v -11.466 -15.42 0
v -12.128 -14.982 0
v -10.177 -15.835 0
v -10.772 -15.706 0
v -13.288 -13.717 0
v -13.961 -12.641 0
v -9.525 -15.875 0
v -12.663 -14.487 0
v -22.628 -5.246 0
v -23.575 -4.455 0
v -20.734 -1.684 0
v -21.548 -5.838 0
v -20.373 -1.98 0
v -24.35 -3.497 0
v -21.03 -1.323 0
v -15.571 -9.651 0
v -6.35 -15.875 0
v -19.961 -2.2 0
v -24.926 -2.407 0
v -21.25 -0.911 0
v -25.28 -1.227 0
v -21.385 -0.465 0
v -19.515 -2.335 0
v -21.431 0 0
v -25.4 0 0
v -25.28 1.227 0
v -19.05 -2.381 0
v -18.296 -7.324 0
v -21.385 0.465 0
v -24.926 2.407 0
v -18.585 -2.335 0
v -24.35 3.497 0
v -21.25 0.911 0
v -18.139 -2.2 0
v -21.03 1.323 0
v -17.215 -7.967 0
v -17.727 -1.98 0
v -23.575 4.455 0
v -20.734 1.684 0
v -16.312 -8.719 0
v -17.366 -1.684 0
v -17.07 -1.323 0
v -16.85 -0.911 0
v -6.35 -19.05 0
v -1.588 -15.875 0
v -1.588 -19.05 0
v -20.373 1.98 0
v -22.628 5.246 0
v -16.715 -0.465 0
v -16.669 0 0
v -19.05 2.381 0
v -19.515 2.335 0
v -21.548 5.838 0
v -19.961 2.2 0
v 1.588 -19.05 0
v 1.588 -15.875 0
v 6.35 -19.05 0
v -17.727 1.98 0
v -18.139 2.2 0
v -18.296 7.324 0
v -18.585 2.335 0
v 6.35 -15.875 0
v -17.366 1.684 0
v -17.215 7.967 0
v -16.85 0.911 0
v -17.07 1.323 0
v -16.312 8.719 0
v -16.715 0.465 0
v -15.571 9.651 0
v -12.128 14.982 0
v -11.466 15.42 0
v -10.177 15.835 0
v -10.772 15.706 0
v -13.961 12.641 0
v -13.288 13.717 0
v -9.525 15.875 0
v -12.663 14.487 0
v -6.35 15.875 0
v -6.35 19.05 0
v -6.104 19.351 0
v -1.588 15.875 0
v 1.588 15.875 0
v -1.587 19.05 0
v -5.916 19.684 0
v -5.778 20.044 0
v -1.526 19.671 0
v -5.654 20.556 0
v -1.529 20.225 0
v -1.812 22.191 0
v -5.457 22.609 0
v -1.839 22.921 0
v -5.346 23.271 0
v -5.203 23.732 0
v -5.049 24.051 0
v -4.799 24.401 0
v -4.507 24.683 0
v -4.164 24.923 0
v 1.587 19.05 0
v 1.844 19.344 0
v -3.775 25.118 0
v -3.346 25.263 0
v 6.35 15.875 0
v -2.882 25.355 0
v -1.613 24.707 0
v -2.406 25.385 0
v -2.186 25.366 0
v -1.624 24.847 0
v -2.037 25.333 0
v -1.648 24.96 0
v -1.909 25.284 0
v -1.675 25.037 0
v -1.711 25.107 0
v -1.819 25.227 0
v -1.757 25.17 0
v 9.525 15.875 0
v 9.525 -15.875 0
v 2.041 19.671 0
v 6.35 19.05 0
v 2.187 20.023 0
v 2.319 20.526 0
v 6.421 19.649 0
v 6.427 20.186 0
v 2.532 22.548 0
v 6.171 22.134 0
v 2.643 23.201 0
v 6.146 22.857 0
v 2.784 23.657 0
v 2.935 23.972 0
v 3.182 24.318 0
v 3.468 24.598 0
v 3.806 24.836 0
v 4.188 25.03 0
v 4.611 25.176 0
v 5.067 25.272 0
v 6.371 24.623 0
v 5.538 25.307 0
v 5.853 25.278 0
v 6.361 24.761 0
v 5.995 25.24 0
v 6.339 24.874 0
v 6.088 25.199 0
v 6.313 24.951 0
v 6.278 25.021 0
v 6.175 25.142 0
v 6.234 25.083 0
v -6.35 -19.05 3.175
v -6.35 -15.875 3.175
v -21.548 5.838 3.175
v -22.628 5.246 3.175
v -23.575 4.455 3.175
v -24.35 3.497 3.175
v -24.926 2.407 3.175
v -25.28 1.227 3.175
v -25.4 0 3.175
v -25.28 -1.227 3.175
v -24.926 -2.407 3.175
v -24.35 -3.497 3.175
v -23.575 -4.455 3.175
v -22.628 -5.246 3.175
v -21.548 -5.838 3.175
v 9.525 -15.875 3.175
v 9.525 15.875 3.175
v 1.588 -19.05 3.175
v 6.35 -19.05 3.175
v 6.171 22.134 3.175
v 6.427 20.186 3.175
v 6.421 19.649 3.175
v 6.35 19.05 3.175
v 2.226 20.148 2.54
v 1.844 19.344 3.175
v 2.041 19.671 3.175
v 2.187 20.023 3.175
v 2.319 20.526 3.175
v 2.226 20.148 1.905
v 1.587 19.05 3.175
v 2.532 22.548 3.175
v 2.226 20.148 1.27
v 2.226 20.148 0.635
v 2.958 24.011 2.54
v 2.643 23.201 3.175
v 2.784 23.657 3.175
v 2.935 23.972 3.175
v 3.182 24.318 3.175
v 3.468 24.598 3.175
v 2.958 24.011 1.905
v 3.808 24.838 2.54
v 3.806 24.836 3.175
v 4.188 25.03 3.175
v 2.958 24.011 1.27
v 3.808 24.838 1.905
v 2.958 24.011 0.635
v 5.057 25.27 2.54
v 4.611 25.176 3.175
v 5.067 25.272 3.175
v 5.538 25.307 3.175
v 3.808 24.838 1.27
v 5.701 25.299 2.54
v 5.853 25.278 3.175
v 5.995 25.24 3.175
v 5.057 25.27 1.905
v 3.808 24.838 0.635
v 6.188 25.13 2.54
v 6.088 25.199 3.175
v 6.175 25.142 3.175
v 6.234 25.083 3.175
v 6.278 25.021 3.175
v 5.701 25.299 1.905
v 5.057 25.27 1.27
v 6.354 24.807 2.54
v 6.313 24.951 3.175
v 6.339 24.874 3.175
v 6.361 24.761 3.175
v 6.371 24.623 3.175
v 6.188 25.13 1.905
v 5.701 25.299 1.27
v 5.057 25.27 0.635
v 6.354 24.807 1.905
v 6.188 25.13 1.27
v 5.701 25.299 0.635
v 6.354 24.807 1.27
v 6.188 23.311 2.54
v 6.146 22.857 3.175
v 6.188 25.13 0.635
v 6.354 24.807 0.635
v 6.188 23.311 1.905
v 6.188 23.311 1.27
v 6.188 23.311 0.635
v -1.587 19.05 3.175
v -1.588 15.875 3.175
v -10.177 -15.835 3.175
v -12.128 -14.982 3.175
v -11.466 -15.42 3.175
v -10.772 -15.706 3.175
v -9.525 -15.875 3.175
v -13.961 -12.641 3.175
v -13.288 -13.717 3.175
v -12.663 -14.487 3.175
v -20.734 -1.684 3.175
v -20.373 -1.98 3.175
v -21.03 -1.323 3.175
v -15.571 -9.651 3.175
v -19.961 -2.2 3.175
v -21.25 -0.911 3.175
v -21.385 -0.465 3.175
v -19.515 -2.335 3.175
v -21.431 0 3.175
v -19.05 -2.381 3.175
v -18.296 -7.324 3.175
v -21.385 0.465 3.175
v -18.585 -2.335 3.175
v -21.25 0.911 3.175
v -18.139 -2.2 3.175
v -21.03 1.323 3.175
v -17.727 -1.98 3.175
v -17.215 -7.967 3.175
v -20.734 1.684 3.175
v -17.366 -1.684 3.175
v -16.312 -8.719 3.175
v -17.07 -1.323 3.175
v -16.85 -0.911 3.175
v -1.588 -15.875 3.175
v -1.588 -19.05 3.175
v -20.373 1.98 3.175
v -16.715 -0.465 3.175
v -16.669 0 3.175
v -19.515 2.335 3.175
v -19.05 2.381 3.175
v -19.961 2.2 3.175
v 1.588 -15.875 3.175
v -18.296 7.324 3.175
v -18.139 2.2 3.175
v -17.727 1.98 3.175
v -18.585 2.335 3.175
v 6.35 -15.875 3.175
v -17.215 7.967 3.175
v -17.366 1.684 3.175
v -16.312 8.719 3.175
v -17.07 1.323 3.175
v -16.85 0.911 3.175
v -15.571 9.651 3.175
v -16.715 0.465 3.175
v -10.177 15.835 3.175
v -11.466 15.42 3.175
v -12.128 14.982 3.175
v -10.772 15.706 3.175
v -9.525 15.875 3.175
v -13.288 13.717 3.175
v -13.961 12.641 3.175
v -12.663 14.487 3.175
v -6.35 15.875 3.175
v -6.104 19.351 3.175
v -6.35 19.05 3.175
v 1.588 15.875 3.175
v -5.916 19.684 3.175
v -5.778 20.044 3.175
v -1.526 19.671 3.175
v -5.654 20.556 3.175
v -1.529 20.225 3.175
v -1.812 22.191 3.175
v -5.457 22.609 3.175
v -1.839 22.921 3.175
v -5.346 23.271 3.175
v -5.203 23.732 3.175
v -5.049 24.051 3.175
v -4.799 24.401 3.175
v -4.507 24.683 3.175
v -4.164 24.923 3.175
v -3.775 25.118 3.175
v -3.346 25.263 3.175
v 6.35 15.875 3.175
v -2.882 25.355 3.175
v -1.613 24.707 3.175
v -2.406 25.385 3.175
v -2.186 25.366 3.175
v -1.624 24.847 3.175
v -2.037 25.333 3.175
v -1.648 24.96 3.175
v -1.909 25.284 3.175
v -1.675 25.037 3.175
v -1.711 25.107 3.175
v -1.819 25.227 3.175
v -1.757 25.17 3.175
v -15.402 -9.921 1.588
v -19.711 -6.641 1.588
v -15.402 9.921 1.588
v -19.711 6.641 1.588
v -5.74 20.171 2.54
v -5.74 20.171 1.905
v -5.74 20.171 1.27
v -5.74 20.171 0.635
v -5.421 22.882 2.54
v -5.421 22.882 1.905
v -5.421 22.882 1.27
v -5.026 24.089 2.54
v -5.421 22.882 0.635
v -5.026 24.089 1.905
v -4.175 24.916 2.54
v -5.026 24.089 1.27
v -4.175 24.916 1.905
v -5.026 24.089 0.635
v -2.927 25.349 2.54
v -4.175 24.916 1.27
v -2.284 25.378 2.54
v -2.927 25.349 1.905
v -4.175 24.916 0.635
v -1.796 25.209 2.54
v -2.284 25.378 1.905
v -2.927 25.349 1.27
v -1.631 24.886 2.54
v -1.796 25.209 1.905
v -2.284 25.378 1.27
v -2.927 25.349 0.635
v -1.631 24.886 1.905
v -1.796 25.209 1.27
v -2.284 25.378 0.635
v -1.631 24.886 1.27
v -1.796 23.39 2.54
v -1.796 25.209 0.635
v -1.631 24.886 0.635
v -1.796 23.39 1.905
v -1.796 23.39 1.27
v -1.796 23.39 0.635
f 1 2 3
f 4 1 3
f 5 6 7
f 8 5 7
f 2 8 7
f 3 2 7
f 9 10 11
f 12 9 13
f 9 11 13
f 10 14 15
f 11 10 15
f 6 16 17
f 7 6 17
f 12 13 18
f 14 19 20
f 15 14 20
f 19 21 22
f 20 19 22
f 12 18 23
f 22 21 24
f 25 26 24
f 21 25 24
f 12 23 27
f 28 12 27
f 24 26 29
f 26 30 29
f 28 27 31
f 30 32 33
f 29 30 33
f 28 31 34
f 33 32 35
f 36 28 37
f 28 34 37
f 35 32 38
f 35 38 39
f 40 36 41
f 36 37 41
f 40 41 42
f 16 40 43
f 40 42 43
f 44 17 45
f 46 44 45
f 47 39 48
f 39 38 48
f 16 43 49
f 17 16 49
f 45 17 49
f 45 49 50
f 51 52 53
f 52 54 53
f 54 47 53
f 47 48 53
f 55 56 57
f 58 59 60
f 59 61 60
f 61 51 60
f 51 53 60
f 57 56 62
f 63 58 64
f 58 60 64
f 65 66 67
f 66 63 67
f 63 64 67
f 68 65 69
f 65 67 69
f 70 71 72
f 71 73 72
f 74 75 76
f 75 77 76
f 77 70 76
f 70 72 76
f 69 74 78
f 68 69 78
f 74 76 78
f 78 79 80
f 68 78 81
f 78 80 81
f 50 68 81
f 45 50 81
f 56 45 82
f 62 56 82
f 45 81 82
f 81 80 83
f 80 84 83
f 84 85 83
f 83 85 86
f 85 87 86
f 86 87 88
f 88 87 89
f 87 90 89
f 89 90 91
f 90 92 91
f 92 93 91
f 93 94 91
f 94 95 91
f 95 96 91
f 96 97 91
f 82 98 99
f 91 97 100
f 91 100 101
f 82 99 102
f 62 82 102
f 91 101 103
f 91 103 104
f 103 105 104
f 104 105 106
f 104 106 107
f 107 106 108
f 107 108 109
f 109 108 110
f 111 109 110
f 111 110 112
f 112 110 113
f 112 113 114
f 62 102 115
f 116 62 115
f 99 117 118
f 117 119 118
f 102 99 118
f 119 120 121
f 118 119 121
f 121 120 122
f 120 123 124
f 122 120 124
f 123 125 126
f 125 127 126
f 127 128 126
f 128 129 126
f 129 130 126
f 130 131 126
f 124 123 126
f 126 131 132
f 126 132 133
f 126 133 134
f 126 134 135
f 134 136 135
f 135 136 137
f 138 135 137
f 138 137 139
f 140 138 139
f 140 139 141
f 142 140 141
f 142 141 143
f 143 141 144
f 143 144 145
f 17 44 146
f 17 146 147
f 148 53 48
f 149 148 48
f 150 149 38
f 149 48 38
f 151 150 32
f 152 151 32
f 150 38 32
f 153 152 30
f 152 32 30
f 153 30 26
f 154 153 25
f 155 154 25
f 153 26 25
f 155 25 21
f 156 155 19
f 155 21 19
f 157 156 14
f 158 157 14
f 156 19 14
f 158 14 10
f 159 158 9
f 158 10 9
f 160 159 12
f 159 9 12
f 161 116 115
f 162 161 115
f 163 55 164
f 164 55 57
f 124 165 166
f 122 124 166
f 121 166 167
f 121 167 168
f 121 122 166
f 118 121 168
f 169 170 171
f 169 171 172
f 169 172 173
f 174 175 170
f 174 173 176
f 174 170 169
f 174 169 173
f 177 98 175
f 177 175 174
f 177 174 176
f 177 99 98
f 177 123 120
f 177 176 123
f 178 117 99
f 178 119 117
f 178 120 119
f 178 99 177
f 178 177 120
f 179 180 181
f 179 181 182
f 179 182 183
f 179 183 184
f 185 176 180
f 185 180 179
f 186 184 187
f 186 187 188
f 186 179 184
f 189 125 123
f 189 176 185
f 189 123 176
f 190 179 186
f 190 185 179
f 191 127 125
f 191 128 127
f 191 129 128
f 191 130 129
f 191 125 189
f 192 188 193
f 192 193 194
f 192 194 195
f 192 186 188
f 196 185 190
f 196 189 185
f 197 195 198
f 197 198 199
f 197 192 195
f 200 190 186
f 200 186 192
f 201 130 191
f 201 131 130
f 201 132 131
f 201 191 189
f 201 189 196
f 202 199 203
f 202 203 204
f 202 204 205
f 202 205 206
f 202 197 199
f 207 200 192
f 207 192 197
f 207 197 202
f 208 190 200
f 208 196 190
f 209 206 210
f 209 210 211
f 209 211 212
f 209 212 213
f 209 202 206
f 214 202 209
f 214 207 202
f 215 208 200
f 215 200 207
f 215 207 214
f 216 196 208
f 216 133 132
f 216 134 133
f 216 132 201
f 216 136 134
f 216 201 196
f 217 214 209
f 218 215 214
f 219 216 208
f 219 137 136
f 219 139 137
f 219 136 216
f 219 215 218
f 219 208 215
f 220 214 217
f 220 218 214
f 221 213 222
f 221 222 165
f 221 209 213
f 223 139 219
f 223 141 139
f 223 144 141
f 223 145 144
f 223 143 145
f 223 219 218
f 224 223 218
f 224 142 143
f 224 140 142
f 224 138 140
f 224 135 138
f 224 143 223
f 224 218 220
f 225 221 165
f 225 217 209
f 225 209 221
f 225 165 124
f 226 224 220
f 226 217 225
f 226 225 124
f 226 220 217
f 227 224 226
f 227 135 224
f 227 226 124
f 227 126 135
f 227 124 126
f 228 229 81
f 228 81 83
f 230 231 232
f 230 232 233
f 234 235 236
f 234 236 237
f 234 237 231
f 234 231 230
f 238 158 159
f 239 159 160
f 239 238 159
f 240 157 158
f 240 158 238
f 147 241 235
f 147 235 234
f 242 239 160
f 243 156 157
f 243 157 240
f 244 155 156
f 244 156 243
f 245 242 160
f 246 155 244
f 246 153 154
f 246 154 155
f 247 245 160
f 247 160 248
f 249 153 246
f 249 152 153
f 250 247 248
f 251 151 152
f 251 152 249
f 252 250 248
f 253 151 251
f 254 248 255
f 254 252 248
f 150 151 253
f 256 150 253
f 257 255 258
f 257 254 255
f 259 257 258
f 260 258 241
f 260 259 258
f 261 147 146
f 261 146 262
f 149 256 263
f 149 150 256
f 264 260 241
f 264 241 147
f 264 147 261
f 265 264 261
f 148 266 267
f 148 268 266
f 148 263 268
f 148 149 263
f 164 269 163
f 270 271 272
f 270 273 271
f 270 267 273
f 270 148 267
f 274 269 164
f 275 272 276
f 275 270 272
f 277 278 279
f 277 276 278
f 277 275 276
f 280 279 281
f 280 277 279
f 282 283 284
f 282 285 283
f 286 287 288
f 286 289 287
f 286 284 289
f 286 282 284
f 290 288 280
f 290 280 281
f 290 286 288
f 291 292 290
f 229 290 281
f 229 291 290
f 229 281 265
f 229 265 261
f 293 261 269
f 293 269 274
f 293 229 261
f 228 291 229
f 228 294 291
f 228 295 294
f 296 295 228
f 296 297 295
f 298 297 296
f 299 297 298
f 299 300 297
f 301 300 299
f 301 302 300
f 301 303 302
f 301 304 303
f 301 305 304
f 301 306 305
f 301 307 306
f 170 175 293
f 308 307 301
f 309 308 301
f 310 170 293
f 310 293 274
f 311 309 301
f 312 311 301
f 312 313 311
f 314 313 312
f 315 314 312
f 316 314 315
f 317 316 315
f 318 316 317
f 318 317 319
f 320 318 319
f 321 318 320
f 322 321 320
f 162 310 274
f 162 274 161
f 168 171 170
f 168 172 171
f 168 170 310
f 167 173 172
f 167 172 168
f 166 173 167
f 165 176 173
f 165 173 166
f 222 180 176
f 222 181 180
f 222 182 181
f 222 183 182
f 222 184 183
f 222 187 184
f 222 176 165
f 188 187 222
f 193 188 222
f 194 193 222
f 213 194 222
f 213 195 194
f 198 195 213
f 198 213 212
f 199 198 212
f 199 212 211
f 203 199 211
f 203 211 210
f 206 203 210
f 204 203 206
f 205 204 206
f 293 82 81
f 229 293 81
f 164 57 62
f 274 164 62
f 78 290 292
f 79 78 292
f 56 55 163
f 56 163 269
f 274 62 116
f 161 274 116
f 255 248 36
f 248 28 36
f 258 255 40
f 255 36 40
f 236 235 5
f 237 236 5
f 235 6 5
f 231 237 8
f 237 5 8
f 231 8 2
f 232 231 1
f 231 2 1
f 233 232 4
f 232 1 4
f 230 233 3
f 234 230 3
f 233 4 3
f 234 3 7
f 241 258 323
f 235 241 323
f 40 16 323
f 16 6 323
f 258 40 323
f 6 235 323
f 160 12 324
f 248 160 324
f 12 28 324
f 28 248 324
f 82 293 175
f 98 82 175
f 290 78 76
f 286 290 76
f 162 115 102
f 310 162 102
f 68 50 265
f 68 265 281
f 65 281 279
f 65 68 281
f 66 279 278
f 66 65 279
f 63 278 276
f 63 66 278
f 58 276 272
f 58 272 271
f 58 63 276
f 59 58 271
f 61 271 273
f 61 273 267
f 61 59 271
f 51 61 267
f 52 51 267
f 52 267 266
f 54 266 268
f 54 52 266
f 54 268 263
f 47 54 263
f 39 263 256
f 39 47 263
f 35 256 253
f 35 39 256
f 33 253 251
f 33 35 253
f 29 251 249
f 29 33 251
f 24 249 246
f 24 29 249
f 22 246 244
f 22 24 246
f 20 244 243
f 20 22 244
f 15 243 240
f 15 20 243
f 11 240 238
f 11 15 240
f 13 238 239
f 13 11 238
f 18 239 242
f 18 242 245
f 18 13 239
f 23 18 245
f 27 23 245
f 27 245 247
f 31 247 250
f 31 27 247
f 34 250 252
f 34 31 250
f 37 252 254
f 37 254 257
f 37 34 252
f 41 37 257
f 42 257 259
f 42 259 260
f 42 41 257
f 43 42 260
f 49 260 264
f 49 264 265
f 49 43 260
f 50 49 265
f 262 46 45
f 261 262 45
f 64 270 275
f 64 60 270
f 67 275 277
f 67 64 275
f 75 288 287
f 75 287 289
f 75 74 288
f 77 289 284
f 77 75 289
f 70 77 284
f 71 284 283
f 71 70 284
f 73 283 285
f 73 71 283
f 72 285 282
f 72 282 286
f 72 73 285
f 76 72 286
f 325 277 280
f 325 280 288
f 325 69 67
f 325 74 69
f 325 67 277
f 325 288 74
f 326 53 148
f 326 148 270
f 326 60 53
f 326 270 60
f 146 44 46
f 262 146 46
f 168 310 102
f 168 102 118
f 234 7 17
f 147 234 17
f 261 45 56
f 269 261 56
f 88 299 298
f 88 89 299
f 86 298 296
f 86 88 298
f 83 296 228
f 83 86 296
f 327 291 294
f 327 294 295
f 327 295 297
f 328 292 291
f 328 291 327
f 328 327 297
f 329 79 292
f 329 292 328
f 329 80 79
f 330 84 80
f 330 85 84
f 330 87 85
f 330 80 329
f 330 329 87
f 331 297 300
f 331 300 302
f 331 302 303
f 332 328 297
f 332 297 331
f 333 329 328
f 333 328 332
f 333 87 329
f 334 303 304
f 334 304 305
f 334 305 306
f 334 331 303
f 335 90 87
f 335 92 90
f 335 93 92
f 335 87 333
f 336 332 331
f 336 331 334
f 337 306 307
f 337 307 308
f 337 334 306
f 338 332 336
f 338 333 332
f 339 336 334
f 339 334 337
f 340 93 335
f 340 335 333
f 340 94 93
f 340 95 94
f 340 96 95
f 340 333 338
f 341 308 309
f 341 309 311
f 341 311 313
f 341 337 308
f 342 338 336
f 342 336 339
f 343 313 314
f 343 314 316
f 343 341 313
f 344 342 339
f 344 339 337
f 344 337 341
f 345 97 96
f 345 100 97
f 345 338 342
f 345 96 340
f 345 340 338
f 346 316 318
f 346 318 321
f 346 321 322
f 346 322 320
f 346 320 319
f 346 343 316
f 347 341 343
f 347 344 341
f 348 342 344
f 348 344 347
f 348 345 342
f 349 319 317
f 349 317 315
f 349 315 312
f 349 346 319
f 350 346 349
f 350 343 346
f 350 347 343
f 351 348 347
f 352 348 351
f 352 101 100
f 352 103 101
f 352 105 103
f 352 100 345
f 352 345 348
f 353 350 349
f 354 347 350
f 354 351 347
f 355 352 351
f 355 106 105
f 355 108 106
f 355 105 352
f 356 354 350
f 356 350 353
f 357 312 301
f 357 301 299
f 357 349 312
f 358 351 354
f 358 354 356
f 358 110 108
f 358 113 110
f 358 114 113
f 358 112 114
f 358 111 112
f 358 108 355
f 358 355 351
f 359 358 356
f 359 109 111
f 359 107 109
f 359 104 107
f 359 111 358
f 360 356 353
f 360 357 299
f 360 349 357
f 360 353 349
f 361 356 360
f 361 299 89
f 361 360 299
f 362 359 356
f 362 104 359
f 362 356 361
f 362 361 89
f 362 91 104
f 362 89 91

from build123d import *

# Parameters (mm, degrees)
SKETCH1_W           = 4.7625
SKETCH1_H           = 3.175
SKETCH1_R           = 2.38125
BOSS_EXTRUDE1_DEPTH = 3.175


with BuildPart() as part:
    # Sketch1 → Boss-Extrude1 (new body)
    # profile 1 of 9: a face of its own
    with BuildSketch(Plane.XY):
        Polygon((6.35, -15.875), (9.525, -15.875), (9.525, 15.875), (6.35, 15.875), (1.5875, 15.875), (-1.5875, 15.875), (-6.35, 15.875), (-9.525, 15.875), (-9.525, -15.875), (-6.35, -15.875), (-1.5875, -15.875), (1.5875, -15.875), align=None)
    # profile 2 of 9: a face of its own
    with BuildSketch(Plane.XY):
        with Locations((3.96875, -17.4625)):
            Rectangle(SKETCH1_W, SKETCH1_H)
    # profile 3 of 9: a face of its own
    with BuildSketch(Plane.XY):
        with Locations((3.96875, 17.4625)):
            Rectangle(SKETCH1_W, SKETCH1_H)
    # profile 4 of 9: a face of its own
    with BuildSketch(Plane.XY):
        with Locations((-3.96875, -17.4625)):
            Rectangle(SKETCH1_W, SKETCH1_H)
    # profile 5 of 9: a face of its own
    with BuildSketch(Plane.XY):
        with BuildLine():
            Line((1.5875, 19.05), (6.35, 19.05))
            add(Edge.make_bspline(
                [(1.5875, 19.05), (2.876060697, 20.282977256), (1.750876168, 23.717010334), (4.480105354, 25.343943309), (6.713969799, 25.323271855), (5.664629716, 22.075566326), (6.66156491, 20.85876393), (6.35, 19.05)],
                knots=[0, 0, 0, 0, 0.347503902, 0.512635707, 0.589513021, 0.712232462, 1, 1, 1, 1], degree=3))
        make_face()
    # profile 6 of 9: a face of its own
    with BuildSketch(Plane.XY):
        with Locations((-3.96875, 17.4625)):
            Rectangle(SKETCH1_W, SKETCH1_H)
    # profile 7 of 9: a face of its own
    with BuildSketch(Plane.XY):
        with BuildLine():
            add(Edge.make_bspline(
                [(-21.547594304, -5.838195157), (-17.741398311, -7.466495201), (-15.030939304, -8.836500628), (-13.009281216, -15.917091584), (-9.525, -15.875)],
                knots=[0, 0, 0, 0, 0.458191309, 1, 1, 1, 1], degree=3))
            Line((-9.525, -15.875), (-9.525, 15.875))
            add(Edge.make_bspline(
                [(-21.547594304, 5.838195157), (-17.741398311, 7.466495201), (-15.030939304, 8.836500628), (-13.009281216, 15.917091584), (-9.525, 15.875)],
                knots=[0, 0, 0, 0, 0.458191309, 1, 1, 1, 1], degree=3))
            ThreePointArc((-21.547594304, 5.838195157), (-15.552659856, 5.300104896), (-12.7, 0))
            ThreePointArc((-12.7, 0), (-15.552659856, -5.300104896), (-21.547594304, -5.838195157))
        make_face()
    # profile 8 of 9: a face of its own
    with BuildSketch(Plane.XY):
        with BuildLine():
            Line((-6.35, 19.05), (-1.5875, 19.05))
            add(Edge.make_bspline(
                [(-6.35, 19.05), (-5.108948033, 20.312838142), (-6.248797567, 23.782627537), (-3.504668245, 25.422749175), (-1.270595434, 25.401850486), (-2.33046195, 22.118193687), (-1.30296019, 20.902293296), (-1.5875, 19.05)],
                knots=[0, 0, 0, 0, 0.348300856, 0.511853831, 0.587996117, 0.709542233, 1, 1, 1, 1], degree=3))
        make_face()
    # profile 9 of 9: a face of its own
    with BuildSketch(Plane.XY):
        with BuildLine():
            ThreePointArc((-21.547594304, 5.838195157), (-25.4, 0), (-21.547594304, -5.838195157))
            ThreePointArc((-21.547594304, -5.838195157), (-15.552659856, -5.300104896), (-12.7, 0))
            ThreePointArc((-12.7, 0), (-15.552659856, 5.300104896), (-21.547594304, 5.838195157))
        make_face()
        with Locations((-19.05, 0)):
            Circle(SKETCH1_R, mode=Mode.SUBTRACT)
    extrude(amount=BOSS_EXTRUDE1_DEPTH)


solid = part.part
